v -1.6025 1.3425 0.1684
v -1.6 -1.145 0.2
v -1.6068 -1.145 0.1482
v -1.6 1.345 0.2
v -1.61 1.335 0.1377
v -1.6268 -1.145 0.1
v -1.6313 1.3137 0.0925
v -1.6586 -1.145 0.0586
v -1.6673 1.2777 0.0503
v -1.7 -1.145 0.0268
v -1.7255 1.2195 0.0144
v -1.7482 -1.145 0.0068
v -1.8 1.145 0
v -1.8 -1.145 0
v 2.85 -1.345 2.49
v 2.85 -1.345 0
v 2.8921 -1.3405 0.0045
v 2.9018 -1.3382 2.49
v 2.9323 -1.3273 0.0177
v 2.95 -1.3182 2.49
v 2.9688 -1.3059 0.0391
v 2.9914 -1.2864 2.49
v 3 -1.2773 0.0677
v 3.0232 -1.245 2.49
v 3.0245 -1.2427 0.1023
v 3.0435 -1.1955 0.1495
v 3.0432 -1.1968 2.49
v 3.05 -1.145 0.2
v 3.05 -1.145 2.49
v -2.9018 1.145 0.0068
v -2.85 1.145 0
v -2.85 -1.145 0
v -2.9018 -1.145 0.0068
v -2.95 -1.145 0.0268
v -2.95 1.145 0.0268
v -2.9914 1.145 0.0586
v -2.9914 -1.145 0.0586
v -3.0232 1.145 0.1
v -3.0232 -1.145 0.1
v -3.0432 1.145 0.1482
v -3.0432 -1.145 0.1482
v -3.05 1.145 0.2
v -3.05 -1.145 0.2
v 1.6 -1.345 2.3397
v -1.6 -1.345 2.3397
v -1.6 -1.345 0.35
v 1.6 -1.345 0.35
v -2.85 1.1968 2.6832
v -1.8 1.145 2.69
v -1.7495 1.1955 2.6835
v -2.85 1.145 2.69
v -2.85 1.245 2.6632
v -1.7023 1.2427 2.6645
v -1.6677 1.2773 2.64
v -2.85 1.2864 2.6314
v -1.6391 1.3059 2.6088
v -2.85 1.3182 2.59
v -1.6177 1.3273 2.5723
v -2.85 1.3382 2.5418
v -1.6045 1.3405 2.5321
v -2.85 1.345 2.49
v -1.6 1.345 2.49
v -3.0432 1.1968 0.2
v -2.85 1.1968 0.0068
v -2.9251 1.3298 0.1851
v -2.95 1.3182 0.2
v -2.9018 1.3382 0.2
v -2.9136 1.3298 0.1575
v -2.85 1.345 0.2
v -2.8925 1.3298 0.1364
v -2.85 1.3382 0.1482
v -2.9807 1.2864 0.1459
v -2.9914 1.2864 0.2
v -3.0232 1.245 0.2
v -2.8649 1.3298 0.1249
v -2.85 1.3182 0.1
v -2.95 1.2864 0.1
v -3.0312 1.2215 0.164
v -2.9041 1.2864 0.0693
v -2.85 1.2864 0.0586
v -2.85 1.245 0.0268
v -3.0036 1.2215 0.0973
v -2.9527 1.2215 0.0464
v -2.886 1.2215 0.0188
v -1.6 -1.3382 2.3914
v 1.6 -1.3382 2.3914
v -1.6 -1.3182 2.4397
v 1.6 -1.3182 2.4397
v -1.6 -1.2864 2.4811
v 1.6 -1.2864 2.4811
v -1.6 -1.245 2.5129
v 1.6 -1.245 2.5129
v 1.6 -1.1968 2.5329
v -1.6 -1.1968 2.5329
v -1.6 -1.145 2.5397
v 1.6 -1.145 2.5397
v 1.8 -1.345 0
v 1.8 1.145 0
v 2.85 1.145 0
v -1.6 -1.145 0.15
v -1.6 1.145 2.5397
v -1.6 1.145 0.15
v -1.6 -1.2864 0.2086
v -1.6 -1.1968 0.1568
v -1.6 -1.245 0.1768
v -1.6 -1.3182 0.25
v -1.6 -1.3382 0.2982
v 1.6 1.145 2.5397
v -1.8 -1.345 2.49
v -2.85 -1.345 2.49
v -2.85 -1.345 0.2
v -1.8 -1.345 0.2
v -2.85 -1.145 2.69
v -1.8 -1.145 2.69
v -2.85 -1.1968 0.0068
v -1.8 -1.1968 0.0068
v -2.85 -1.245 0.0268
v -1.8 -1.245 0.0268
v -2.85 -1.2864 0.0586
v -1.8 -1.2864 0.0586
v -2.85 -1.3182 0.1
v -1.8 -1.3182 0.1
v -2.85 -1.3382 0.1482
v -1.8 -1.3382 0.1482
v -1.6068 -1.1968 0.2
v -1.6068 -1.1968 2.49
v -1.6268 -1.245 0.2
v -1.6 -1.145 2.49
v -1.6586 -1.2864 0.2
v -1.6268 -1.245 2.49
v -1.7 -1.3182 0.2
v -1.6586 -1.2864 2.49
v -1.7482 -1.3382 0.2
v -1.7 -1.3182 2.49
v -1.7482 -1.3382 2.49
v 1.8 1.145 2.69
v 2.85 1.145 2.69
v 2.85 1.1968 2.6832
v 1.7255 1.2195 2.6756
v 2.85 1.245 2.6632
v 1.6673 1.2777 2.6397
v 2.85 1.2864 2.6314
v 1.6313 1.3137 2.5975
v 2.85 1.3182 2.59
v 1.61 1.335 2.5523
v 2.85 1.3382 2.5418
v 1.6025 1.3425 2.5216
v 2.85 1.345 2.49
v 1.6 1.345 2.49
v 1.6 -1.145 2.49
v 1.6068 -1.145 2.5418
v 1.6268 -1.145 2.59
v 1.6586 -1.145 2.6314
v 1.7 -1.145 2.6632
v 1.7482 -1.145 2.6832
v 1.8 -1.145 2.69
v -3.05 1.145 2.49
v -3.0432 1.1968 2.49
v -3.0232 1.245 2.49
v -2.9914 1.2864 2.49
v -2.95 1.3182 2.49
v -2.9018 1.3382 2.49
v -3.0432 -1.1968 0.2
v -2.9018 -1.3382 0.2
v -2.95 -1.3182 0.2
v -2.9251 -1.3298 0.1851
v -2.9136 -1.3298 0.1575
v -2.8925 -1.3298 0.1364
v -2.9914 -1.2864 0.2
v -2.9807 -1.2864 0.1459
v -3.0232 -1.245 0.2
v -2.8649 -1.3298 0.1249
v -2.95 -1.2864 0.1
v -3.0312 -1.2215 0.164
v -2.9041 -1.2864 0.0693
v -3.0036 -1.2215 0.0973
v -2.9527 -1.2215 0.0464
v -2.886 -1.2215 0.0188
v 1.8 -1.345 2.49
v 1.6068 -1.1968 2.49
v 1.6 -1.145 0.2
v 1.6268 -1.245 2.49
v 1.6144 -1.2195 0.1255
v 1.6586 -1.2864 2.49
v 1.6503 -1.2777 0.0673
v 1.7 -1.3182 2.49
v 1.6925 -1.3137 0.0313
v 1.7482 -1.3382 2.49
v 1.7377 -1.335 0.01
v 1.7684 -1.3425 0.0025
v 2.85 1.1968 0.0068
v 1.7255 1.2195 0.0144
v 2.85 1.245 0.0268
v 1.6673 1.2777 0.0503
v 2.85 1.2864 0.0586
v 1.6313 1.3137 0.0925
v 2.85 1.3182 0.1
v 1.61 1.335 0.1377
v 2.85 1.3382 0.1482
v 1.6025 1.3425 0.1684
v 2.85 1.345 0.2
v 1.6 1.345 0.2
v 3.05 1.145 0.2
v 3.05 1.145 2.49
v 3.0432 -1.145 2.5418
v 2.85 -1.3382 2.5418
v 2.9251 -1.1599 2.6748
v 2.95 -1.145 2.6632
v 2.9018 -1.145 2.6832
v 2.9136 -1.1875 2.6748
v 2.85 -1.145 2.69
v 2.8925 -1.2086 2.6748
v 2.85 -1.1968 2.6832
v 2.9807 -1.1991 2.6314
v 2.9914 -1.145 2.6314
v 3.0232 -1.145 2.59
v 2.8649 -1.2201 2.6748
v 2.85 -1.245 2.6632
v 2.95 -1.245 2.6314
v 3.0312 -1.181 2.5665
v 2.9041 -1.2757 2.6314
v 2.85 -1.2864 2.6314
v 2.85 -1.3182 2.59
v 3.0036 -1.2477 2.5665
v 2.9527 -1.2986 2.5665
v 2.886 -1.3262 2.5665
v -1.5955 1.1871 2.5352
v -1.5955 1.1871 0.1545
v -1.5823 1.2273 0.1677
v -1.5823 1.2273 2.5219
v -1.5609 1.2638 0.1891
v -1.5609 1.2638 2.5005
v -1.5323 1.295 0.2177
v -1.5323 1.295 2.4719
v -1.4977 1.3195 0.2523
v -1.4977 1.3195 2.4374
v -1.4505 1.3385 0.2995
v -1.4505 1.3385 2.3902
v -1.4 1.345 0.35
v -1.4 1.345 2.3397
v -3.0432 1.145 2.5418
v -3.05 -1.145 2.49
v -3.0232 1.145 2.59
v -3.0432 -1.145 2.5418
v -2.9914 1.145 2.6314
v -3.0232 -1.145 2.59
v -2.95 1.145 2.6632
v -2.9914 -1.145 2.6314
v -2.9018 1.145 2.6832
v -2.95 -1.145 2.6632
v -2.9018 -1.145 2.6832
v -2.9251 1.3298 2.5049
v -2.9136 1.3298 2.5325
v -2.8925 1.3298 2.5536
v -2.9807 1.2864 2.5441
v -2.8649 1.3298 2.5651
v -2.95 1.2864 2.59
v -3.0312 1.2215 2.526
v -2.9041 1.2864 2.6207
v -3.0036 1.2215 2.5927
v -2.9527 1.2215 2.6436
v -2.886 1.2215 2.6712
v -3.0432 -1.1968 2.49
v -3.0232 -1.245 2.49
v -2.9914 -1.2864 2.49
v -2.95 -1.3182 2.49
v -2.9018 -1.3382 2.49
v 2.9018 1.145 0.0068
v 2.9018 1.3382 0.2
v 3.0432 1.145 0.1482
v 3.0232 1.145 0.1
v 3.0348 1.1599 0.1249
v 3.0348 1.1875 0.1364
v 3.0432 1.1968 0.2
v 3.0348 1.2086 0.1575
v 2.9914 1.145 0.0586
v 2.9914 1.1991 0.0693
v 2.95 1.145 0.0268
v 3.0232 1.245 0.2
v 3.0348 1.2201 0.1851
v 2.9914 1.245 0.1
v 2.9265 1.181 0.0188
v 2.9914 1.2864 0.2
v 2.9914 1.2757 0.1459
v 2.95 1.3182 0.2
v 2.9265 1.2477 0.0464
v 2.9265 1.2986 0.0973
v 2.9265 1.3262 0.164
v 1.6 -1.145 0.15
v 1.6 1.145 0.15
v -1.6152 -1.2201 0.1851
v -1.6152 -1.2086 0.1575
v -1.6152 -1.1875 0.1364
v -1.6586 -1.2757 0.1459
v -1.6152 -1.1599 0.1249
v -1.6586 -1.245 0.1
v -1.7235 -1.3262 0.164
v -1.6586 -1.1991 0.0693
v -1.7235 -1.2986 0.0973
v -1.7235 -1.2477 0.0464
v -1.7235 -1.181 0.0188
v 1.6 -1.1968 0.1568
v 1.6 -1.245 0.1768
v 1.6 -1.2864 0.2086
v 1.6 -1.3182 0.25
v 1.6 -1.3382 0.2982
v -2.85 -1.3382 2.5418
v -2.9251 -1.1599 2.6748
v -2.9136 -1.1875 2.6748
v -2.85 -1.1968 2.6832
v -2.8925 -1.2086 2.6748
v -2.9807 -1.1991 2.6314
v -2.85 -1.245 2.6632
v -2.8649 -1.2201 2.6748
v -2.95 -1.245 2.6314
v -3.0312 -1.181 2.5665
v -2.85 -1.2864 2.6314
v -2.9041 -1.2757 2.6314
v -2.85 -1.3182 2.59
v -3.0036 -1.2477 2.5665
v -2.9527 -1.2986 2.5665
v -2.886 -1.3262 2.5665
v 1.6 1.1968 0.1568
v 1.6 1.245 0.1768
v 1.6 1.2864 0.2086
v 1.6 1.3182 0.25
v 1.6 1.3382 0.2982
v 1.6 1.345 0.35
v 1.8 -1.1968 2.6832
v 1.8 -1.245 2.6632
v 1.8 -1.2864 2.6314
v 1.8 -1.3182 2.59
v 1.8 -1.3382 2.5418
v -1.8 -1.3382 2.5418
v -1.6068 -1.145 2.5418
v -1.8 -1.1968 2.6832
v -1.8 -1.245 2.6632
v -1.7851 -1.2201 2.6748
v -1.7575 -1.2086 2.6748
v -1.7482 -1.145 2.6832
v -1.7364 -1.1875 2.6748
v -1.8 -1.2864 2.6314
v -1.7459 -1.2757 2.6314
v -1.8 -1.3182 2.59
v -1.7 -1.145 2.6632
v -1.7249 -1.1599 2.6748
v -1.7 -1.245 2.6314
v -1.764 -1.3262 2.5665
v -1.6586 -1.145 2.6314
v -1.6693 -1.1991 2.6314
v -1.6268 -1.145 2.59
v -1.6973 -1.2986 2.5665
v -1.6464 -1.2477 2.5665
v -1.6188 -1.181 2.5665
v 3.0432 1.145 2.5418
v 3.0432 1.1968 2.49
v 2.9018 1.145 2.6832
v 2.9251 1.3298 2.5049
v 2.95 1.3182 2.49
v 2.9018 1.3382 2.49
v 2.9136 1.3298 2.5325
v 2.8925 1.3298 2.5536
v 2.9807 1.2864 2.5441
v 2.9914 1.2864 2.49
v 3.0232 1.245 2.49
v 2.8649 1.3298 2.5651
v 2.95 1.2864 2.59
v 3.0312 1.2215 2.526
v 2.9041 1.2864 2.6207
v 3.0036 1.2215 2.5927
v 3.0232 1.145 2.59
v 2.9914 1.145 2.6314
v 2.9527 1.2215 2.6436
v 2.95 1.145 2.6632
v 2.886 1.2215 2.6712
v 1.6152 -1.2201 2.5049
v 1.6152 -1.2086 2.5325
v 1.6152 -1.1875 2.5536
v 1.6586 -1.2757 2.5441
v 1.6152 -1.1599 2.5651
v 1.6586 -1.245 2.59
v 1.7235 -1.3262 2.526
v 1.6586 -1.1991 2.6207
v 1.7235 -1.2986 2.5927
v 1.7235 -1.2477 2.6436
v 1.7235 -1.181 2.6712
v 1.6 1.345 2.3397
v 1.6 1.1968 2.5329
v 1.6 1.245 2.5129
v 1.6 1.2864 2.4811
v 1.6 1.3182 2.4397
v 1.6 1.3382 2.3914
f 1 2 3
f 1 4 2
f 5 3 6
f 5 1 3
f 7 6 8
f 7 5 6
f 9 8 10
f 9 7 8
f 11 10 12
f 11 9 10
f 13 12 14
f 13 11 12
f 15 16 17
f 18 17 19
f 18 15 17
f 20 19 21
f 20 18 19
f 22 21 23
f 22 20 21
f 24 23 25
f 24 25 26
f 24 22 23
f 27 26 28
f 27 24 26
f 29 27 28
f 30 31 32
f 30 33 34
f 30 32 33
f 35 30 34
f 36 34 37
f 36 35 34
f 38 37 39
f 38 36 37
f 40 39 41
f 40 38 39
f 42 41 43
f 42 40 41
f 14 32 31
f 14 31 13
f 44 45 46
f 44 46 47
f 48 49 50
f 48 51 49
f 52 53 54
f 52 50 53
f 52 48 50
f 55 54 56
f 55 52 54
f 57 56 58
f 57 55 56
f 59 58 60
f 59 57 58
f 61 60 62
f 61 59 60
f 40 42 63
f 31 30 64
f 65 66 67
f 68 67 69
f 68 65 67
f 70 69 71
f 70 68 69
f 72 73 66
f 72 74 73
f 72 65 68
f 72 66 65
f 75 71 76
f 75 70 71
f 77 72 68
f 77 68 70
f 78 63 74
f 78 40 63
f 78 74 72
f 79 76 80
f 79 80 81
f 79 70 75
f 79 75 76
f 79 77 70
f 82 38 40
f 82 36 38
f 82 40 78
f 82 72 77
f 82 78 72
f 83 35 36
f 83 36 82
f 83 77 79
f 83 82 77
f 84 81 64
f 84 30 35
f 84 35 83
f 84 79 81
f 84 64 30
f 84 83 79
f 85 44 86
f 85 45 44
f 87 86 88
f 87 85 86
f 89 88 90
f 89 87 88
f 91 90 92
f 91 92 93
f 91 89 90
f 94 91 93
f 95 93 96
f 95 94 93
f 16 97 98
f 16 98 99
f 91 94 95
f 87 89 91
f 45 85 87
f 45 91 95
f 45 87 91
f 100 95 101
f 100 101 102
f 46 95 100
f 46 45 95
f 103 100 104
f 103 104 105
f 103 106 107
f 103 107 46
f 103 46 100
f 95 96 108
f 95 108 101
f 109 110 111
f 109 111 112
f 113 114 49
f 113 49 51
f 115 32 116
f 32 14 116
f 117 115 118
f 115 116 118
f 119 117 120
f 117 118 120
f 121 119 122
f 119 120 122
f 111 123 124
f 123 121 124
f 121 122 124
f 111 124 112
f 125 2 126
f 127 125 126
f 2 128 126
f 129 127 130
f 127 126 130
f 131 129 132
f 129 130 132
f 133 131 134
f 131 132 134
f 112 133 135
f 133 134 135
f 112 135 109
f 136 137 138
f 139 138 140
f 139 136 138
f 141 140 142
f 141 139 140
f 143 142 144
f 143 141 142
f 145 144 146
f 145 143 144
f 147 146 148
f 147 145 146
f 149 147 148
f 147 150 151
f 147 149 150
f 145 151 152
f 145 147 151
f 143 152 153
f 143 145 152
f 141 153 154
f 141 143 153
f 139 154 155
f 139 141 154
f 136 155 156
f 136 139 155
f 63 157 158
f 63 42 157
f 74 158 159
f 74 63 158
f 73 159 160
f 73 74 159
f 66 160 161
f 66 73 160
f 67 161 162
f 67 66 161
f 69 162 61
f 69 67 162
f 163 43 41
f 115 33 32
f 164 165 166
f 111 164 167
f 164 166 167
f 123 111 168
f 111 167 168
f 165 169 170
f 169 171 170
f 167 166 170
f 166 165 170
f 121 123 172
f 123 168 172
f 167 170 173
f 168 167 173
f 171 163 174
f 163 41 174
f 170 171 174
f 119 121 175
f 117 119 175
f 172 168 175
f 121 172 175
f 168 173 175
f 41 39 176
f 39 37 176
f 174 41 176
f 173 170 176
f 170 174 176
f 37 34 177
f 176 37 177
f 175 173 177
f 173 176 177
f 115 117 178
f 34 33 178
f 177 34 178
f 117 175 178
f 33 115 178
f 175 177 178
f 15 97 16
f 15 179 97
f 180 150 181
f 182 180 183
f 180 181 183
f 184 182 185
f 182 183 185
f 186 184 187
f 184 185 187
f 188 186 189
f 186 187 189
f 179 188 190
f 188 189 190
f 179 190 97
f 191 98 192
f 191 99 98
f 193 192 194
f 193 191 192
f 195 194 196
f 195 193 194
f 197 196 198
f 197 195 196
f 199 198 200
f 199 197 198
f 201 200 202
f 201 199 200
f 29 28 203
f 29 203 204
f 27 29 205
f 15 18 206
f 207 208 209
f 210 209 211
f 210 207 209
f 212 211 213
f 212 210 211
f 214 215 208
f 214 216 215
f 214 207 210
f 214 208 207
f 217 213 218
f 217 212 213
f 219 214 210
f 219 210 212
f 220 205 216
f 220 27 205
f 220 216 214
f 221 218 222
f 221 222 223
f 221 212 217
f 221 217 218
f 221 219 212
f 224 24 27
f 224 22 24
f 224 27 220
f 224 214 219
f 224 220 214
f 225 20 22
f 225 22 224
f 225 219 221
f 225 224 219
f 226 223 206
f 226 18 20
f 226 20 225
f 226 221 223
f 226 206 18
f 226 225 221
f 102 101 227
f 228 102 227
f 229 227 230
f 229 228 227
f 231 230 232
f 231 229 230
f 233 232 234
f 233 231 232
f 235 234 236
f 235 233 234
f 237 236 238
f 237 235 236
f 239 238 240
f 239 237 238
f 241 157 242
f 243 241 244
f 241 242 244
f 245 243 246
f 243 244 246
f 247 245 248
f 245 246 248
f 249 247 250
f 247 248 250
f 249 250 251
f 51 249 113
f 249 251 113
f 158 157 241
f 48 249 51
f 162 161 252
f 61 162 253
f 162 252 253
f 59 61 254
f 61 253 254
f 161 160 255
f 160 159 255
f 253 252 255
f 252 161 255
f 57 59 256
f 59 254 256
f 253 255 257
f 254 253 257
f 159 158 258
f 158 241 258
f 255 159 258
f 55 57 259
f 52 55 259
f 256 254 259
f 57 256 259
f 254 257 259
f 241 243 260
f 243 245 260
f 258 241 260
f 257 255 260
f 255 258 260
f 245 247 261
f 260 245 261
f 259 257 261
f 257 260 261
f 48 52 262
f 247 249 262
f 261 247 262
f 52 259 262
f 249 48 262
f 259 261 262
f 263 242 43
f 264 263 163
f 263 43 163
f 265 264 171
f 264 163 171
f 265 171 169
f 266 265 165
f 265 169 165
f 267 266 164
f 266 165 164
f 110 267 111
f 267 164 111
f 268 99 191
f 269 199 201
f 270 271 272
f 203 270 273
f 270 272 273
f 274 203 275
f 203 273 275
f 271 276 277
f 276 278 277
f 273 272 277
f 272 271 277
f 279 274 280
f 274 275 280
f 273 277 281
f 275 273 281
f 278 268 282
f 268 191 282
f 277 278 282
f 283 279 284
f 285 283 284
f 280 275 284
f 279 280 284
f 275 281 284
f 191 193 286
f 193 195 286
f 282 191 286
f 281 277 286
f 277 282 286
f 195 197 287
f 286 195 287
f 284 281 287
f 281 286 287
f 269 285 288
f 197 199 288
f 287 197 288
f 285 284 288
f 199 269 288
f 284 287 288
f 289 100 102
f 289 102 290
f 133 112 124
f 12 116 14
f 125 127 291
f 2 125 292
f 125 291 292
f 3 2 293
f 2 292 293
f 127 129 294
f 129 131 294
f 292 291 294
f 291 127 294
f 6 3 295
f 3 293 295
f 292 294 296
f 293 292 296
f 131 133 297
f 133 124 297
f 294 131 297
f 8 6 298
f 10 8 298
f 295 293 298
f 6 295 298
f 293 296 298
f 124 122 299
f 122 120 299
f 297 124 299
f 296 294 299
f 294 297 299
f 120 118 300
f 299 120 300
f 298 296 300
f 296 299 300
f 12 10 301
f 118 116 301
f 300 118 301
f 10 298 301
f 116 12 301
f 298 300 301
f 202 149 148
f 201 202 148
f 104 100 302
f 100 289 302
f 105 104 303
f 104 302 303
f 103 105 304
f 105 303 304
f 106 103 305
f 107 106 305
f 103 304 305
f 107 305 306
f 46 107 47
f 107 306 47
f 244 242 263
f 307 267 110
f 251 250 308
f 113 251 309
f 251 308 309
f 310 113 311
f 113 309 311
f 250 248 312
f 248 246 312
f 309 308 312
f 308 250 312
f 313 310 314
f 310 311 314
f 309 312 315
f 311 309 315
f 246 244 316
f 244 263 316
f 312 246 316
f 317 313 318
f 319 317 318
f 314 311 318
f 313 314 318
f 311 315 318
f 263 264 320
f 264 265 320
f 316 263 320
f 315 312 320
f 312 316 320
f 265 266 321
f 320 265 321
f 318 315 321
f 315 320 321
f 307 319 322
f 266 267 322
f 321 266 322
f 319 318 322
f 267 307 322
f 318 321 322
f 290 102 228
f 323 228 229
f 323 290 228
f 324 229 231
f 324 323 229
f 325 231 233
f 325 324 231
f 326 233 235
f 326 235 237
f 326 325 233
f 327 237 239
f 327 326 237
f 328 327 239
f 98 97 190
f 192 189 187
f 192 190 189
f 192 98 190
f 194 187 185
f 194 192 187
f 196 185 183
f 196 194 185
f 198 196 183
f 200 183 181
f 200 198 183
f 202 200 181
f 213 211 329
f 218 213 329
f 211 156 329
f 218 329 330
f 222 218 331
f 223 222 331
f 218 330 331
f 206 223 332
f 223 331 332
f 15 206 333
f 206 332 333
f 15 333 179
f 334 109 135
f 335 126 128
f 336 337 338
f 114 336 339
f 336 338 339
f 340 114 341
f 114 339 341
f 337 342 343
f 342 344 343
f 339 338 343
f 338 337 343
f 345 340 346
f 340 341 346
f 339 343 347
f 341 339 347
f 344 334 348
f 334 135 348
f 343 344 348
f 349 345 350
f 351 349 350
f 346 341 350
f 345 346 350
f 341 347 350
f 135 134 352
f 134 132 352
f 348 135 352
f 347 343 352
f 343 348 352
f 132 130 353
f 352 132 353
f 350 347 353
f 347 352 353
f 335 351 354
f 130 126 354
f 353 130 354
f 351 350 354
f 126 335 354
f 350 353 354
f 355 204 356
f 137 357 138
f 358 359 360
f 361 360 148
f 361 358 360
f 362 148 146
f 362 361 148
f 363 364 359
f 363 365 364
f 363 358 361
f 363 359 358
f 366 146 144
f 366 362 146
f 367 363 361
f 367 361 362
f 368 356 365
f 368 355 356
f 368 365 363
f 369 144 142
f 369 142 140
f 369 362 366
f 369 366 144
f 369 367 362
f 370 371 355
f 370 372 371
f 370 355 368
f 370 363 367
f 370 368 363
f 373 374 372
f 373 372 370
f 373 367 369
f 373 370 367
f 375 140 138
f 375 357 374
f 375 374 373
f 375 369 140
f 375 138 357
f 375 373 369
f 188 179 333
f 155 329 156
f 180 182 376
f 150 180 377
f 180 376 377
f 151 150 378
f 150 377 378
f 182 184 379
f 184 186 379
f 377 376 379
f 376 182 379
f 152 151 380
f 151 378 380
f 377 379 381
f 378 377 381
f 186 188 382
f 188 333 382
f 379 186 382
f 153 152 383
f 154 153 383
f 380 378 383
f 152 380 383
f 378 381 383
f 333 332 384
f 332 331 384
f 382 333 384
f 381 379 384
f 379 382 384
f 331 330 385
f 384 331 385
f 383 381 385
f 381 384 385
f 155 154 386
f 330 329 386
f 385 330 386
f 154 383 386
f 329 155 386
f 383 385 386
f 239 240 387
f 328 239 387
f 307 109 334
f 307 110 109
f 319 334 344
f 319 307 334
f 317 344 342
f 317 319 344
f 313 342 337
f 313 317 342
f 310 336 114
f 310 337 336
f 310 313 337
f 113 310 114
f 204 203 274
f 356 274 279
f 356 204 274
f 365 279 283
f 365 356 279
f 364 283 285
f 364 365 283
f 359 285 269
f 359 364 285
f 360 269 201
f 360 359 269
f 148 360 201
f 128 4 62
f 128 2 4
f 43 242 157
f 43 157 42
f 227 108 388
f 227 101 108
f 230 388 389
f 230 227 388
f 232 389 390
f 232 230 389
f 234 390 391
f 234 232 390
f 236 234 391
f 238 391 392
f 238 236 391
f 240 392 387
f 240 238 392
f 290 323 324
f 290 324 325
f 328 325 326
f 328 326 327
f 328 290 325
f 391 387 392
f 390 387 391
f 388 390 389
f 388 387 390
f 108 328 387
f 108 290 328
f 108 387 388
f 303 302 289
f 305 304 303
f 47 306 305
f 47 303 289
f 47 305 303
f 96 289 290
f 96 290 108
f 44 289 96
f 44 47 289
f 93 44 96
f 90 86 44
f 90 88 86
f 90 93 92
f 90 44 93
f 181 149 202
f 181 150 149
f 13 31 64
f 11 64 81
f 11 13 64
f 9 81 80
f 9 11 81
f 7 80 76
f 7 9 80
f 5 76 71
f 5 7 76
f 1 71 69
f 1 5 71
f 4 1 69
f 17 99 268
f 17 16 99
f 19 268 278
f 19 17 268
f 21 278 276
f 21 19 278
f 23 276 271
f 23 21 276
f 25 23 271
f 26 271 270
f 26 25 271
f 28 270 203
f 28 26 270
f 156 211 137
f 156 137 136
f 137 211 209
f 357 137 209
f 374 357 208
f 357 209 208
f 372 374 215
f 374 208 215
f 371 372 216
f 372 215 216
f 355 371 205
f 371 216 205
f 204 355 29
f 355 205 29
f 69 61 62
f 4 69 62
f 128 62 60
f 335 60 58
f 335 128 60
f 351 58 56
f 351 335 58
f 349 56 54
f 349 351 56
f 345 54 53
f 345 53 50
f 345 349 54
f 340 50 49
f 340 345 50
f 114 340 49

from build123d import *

# Parameters (mm, degrees)
F1_DEPTH = 1.345
F2_DEPTH = 1.345
F3_R     = 0.2
F3_2_R   = 0.2
F3_3_R   = 0.2


with BuildPart() as f1:
    # F0 (on Front) → F1 (new body, symmetric)
    with BuildSketch(Plane.XZ):
        Polygon((-1.6, 0), (-1.6, 0.15), (-1.6, 2.5396689307), (-1.6, 2.69), (-3.05, 2.69), (-3.05, 0), align=None)
    extrude(amount=F1_DEPTH, both=True)

    # F3#3
    f3_3_edges = [f1.edges().sort_by_distance(p)[0] for p in [
        (-3.05, 0, 0),
        (-3.05, -1.345, 1.345),
        (-3.05, 0, 2.69),
        (-3.05, 1.345, 1.345),
        (-2.325, 1.345, 0),
        (-2.325, -1.345, 0),
        (-1.6, -1.345, 1.345),
        (-1.6, 0, 0),
        (-2.325, -1.345, 2.69),
        (-1.6, 0, 2.69),
        (-2.325, 1.345, 2.69),
    ]]
    fillet(f3_3_edges, radius=F3_3_R)


with BuildPart() as f1b:
    # F0 (on Front) → F1, piece 2 (new body, symmetric)
    with BuildSketch(Plane.XZ):
        Polygon((1.6, 0.15), (1.6, 0), (3.05, 0), (3.05, 2.69), (1.6, 2.69), (1.6, 2.5396689307), align=None)
    extrude(amount=F1_DEPTH, both=True)

    # F3
    f3_edges = [f1b.edges().sort_by_distance(p)[0] for p in [
        (2.325, 1.345, 0),
        (3.05, 0, 0),
        (3.05, -1.345, 1.345),
        (3.05, 0, 2.69),
        (3.05, 1.345, 1.345),
        (2.325, 1.345, 2.69),
        (2.325, -1.345, 2.69),
        (1.6, -1.345, 1.345),
        (1.6, 0, 2.69),
        (1.6, 0, 0),
    ]]
    fillet(f3_edges, radius=F3_R)


with BuildPart() as f2:
    # F0 (on Front) → F2 (new body, symmetric)
    with BuildSketch(Plane.XZ):
        Polygon((0, 0.15), (1.6, 0.15), (1.6, 2.5396689307), (0, 2.5396689307), (-1.6, 2.5396689307), (-1.6, 0.15), align=None)
    extrude(amount=F2_DEPTH, both=True)

    # F3#2
    f3_2_edges = [f2.edges().sort_by_distance(p)[0] for p in [
        (0, -1.345, 2.539669),
        (0, -1.345, 0.15),
        (0, 1.345, 2.539669),
        (0, 1.345, 0.15),
        (-1.6, 1.345, 1.344834),
    ]]
    fillet(f3_2_edges, radius=F3_2_R)


solid = Compound([f1.part, f1b.part, f2.part])
